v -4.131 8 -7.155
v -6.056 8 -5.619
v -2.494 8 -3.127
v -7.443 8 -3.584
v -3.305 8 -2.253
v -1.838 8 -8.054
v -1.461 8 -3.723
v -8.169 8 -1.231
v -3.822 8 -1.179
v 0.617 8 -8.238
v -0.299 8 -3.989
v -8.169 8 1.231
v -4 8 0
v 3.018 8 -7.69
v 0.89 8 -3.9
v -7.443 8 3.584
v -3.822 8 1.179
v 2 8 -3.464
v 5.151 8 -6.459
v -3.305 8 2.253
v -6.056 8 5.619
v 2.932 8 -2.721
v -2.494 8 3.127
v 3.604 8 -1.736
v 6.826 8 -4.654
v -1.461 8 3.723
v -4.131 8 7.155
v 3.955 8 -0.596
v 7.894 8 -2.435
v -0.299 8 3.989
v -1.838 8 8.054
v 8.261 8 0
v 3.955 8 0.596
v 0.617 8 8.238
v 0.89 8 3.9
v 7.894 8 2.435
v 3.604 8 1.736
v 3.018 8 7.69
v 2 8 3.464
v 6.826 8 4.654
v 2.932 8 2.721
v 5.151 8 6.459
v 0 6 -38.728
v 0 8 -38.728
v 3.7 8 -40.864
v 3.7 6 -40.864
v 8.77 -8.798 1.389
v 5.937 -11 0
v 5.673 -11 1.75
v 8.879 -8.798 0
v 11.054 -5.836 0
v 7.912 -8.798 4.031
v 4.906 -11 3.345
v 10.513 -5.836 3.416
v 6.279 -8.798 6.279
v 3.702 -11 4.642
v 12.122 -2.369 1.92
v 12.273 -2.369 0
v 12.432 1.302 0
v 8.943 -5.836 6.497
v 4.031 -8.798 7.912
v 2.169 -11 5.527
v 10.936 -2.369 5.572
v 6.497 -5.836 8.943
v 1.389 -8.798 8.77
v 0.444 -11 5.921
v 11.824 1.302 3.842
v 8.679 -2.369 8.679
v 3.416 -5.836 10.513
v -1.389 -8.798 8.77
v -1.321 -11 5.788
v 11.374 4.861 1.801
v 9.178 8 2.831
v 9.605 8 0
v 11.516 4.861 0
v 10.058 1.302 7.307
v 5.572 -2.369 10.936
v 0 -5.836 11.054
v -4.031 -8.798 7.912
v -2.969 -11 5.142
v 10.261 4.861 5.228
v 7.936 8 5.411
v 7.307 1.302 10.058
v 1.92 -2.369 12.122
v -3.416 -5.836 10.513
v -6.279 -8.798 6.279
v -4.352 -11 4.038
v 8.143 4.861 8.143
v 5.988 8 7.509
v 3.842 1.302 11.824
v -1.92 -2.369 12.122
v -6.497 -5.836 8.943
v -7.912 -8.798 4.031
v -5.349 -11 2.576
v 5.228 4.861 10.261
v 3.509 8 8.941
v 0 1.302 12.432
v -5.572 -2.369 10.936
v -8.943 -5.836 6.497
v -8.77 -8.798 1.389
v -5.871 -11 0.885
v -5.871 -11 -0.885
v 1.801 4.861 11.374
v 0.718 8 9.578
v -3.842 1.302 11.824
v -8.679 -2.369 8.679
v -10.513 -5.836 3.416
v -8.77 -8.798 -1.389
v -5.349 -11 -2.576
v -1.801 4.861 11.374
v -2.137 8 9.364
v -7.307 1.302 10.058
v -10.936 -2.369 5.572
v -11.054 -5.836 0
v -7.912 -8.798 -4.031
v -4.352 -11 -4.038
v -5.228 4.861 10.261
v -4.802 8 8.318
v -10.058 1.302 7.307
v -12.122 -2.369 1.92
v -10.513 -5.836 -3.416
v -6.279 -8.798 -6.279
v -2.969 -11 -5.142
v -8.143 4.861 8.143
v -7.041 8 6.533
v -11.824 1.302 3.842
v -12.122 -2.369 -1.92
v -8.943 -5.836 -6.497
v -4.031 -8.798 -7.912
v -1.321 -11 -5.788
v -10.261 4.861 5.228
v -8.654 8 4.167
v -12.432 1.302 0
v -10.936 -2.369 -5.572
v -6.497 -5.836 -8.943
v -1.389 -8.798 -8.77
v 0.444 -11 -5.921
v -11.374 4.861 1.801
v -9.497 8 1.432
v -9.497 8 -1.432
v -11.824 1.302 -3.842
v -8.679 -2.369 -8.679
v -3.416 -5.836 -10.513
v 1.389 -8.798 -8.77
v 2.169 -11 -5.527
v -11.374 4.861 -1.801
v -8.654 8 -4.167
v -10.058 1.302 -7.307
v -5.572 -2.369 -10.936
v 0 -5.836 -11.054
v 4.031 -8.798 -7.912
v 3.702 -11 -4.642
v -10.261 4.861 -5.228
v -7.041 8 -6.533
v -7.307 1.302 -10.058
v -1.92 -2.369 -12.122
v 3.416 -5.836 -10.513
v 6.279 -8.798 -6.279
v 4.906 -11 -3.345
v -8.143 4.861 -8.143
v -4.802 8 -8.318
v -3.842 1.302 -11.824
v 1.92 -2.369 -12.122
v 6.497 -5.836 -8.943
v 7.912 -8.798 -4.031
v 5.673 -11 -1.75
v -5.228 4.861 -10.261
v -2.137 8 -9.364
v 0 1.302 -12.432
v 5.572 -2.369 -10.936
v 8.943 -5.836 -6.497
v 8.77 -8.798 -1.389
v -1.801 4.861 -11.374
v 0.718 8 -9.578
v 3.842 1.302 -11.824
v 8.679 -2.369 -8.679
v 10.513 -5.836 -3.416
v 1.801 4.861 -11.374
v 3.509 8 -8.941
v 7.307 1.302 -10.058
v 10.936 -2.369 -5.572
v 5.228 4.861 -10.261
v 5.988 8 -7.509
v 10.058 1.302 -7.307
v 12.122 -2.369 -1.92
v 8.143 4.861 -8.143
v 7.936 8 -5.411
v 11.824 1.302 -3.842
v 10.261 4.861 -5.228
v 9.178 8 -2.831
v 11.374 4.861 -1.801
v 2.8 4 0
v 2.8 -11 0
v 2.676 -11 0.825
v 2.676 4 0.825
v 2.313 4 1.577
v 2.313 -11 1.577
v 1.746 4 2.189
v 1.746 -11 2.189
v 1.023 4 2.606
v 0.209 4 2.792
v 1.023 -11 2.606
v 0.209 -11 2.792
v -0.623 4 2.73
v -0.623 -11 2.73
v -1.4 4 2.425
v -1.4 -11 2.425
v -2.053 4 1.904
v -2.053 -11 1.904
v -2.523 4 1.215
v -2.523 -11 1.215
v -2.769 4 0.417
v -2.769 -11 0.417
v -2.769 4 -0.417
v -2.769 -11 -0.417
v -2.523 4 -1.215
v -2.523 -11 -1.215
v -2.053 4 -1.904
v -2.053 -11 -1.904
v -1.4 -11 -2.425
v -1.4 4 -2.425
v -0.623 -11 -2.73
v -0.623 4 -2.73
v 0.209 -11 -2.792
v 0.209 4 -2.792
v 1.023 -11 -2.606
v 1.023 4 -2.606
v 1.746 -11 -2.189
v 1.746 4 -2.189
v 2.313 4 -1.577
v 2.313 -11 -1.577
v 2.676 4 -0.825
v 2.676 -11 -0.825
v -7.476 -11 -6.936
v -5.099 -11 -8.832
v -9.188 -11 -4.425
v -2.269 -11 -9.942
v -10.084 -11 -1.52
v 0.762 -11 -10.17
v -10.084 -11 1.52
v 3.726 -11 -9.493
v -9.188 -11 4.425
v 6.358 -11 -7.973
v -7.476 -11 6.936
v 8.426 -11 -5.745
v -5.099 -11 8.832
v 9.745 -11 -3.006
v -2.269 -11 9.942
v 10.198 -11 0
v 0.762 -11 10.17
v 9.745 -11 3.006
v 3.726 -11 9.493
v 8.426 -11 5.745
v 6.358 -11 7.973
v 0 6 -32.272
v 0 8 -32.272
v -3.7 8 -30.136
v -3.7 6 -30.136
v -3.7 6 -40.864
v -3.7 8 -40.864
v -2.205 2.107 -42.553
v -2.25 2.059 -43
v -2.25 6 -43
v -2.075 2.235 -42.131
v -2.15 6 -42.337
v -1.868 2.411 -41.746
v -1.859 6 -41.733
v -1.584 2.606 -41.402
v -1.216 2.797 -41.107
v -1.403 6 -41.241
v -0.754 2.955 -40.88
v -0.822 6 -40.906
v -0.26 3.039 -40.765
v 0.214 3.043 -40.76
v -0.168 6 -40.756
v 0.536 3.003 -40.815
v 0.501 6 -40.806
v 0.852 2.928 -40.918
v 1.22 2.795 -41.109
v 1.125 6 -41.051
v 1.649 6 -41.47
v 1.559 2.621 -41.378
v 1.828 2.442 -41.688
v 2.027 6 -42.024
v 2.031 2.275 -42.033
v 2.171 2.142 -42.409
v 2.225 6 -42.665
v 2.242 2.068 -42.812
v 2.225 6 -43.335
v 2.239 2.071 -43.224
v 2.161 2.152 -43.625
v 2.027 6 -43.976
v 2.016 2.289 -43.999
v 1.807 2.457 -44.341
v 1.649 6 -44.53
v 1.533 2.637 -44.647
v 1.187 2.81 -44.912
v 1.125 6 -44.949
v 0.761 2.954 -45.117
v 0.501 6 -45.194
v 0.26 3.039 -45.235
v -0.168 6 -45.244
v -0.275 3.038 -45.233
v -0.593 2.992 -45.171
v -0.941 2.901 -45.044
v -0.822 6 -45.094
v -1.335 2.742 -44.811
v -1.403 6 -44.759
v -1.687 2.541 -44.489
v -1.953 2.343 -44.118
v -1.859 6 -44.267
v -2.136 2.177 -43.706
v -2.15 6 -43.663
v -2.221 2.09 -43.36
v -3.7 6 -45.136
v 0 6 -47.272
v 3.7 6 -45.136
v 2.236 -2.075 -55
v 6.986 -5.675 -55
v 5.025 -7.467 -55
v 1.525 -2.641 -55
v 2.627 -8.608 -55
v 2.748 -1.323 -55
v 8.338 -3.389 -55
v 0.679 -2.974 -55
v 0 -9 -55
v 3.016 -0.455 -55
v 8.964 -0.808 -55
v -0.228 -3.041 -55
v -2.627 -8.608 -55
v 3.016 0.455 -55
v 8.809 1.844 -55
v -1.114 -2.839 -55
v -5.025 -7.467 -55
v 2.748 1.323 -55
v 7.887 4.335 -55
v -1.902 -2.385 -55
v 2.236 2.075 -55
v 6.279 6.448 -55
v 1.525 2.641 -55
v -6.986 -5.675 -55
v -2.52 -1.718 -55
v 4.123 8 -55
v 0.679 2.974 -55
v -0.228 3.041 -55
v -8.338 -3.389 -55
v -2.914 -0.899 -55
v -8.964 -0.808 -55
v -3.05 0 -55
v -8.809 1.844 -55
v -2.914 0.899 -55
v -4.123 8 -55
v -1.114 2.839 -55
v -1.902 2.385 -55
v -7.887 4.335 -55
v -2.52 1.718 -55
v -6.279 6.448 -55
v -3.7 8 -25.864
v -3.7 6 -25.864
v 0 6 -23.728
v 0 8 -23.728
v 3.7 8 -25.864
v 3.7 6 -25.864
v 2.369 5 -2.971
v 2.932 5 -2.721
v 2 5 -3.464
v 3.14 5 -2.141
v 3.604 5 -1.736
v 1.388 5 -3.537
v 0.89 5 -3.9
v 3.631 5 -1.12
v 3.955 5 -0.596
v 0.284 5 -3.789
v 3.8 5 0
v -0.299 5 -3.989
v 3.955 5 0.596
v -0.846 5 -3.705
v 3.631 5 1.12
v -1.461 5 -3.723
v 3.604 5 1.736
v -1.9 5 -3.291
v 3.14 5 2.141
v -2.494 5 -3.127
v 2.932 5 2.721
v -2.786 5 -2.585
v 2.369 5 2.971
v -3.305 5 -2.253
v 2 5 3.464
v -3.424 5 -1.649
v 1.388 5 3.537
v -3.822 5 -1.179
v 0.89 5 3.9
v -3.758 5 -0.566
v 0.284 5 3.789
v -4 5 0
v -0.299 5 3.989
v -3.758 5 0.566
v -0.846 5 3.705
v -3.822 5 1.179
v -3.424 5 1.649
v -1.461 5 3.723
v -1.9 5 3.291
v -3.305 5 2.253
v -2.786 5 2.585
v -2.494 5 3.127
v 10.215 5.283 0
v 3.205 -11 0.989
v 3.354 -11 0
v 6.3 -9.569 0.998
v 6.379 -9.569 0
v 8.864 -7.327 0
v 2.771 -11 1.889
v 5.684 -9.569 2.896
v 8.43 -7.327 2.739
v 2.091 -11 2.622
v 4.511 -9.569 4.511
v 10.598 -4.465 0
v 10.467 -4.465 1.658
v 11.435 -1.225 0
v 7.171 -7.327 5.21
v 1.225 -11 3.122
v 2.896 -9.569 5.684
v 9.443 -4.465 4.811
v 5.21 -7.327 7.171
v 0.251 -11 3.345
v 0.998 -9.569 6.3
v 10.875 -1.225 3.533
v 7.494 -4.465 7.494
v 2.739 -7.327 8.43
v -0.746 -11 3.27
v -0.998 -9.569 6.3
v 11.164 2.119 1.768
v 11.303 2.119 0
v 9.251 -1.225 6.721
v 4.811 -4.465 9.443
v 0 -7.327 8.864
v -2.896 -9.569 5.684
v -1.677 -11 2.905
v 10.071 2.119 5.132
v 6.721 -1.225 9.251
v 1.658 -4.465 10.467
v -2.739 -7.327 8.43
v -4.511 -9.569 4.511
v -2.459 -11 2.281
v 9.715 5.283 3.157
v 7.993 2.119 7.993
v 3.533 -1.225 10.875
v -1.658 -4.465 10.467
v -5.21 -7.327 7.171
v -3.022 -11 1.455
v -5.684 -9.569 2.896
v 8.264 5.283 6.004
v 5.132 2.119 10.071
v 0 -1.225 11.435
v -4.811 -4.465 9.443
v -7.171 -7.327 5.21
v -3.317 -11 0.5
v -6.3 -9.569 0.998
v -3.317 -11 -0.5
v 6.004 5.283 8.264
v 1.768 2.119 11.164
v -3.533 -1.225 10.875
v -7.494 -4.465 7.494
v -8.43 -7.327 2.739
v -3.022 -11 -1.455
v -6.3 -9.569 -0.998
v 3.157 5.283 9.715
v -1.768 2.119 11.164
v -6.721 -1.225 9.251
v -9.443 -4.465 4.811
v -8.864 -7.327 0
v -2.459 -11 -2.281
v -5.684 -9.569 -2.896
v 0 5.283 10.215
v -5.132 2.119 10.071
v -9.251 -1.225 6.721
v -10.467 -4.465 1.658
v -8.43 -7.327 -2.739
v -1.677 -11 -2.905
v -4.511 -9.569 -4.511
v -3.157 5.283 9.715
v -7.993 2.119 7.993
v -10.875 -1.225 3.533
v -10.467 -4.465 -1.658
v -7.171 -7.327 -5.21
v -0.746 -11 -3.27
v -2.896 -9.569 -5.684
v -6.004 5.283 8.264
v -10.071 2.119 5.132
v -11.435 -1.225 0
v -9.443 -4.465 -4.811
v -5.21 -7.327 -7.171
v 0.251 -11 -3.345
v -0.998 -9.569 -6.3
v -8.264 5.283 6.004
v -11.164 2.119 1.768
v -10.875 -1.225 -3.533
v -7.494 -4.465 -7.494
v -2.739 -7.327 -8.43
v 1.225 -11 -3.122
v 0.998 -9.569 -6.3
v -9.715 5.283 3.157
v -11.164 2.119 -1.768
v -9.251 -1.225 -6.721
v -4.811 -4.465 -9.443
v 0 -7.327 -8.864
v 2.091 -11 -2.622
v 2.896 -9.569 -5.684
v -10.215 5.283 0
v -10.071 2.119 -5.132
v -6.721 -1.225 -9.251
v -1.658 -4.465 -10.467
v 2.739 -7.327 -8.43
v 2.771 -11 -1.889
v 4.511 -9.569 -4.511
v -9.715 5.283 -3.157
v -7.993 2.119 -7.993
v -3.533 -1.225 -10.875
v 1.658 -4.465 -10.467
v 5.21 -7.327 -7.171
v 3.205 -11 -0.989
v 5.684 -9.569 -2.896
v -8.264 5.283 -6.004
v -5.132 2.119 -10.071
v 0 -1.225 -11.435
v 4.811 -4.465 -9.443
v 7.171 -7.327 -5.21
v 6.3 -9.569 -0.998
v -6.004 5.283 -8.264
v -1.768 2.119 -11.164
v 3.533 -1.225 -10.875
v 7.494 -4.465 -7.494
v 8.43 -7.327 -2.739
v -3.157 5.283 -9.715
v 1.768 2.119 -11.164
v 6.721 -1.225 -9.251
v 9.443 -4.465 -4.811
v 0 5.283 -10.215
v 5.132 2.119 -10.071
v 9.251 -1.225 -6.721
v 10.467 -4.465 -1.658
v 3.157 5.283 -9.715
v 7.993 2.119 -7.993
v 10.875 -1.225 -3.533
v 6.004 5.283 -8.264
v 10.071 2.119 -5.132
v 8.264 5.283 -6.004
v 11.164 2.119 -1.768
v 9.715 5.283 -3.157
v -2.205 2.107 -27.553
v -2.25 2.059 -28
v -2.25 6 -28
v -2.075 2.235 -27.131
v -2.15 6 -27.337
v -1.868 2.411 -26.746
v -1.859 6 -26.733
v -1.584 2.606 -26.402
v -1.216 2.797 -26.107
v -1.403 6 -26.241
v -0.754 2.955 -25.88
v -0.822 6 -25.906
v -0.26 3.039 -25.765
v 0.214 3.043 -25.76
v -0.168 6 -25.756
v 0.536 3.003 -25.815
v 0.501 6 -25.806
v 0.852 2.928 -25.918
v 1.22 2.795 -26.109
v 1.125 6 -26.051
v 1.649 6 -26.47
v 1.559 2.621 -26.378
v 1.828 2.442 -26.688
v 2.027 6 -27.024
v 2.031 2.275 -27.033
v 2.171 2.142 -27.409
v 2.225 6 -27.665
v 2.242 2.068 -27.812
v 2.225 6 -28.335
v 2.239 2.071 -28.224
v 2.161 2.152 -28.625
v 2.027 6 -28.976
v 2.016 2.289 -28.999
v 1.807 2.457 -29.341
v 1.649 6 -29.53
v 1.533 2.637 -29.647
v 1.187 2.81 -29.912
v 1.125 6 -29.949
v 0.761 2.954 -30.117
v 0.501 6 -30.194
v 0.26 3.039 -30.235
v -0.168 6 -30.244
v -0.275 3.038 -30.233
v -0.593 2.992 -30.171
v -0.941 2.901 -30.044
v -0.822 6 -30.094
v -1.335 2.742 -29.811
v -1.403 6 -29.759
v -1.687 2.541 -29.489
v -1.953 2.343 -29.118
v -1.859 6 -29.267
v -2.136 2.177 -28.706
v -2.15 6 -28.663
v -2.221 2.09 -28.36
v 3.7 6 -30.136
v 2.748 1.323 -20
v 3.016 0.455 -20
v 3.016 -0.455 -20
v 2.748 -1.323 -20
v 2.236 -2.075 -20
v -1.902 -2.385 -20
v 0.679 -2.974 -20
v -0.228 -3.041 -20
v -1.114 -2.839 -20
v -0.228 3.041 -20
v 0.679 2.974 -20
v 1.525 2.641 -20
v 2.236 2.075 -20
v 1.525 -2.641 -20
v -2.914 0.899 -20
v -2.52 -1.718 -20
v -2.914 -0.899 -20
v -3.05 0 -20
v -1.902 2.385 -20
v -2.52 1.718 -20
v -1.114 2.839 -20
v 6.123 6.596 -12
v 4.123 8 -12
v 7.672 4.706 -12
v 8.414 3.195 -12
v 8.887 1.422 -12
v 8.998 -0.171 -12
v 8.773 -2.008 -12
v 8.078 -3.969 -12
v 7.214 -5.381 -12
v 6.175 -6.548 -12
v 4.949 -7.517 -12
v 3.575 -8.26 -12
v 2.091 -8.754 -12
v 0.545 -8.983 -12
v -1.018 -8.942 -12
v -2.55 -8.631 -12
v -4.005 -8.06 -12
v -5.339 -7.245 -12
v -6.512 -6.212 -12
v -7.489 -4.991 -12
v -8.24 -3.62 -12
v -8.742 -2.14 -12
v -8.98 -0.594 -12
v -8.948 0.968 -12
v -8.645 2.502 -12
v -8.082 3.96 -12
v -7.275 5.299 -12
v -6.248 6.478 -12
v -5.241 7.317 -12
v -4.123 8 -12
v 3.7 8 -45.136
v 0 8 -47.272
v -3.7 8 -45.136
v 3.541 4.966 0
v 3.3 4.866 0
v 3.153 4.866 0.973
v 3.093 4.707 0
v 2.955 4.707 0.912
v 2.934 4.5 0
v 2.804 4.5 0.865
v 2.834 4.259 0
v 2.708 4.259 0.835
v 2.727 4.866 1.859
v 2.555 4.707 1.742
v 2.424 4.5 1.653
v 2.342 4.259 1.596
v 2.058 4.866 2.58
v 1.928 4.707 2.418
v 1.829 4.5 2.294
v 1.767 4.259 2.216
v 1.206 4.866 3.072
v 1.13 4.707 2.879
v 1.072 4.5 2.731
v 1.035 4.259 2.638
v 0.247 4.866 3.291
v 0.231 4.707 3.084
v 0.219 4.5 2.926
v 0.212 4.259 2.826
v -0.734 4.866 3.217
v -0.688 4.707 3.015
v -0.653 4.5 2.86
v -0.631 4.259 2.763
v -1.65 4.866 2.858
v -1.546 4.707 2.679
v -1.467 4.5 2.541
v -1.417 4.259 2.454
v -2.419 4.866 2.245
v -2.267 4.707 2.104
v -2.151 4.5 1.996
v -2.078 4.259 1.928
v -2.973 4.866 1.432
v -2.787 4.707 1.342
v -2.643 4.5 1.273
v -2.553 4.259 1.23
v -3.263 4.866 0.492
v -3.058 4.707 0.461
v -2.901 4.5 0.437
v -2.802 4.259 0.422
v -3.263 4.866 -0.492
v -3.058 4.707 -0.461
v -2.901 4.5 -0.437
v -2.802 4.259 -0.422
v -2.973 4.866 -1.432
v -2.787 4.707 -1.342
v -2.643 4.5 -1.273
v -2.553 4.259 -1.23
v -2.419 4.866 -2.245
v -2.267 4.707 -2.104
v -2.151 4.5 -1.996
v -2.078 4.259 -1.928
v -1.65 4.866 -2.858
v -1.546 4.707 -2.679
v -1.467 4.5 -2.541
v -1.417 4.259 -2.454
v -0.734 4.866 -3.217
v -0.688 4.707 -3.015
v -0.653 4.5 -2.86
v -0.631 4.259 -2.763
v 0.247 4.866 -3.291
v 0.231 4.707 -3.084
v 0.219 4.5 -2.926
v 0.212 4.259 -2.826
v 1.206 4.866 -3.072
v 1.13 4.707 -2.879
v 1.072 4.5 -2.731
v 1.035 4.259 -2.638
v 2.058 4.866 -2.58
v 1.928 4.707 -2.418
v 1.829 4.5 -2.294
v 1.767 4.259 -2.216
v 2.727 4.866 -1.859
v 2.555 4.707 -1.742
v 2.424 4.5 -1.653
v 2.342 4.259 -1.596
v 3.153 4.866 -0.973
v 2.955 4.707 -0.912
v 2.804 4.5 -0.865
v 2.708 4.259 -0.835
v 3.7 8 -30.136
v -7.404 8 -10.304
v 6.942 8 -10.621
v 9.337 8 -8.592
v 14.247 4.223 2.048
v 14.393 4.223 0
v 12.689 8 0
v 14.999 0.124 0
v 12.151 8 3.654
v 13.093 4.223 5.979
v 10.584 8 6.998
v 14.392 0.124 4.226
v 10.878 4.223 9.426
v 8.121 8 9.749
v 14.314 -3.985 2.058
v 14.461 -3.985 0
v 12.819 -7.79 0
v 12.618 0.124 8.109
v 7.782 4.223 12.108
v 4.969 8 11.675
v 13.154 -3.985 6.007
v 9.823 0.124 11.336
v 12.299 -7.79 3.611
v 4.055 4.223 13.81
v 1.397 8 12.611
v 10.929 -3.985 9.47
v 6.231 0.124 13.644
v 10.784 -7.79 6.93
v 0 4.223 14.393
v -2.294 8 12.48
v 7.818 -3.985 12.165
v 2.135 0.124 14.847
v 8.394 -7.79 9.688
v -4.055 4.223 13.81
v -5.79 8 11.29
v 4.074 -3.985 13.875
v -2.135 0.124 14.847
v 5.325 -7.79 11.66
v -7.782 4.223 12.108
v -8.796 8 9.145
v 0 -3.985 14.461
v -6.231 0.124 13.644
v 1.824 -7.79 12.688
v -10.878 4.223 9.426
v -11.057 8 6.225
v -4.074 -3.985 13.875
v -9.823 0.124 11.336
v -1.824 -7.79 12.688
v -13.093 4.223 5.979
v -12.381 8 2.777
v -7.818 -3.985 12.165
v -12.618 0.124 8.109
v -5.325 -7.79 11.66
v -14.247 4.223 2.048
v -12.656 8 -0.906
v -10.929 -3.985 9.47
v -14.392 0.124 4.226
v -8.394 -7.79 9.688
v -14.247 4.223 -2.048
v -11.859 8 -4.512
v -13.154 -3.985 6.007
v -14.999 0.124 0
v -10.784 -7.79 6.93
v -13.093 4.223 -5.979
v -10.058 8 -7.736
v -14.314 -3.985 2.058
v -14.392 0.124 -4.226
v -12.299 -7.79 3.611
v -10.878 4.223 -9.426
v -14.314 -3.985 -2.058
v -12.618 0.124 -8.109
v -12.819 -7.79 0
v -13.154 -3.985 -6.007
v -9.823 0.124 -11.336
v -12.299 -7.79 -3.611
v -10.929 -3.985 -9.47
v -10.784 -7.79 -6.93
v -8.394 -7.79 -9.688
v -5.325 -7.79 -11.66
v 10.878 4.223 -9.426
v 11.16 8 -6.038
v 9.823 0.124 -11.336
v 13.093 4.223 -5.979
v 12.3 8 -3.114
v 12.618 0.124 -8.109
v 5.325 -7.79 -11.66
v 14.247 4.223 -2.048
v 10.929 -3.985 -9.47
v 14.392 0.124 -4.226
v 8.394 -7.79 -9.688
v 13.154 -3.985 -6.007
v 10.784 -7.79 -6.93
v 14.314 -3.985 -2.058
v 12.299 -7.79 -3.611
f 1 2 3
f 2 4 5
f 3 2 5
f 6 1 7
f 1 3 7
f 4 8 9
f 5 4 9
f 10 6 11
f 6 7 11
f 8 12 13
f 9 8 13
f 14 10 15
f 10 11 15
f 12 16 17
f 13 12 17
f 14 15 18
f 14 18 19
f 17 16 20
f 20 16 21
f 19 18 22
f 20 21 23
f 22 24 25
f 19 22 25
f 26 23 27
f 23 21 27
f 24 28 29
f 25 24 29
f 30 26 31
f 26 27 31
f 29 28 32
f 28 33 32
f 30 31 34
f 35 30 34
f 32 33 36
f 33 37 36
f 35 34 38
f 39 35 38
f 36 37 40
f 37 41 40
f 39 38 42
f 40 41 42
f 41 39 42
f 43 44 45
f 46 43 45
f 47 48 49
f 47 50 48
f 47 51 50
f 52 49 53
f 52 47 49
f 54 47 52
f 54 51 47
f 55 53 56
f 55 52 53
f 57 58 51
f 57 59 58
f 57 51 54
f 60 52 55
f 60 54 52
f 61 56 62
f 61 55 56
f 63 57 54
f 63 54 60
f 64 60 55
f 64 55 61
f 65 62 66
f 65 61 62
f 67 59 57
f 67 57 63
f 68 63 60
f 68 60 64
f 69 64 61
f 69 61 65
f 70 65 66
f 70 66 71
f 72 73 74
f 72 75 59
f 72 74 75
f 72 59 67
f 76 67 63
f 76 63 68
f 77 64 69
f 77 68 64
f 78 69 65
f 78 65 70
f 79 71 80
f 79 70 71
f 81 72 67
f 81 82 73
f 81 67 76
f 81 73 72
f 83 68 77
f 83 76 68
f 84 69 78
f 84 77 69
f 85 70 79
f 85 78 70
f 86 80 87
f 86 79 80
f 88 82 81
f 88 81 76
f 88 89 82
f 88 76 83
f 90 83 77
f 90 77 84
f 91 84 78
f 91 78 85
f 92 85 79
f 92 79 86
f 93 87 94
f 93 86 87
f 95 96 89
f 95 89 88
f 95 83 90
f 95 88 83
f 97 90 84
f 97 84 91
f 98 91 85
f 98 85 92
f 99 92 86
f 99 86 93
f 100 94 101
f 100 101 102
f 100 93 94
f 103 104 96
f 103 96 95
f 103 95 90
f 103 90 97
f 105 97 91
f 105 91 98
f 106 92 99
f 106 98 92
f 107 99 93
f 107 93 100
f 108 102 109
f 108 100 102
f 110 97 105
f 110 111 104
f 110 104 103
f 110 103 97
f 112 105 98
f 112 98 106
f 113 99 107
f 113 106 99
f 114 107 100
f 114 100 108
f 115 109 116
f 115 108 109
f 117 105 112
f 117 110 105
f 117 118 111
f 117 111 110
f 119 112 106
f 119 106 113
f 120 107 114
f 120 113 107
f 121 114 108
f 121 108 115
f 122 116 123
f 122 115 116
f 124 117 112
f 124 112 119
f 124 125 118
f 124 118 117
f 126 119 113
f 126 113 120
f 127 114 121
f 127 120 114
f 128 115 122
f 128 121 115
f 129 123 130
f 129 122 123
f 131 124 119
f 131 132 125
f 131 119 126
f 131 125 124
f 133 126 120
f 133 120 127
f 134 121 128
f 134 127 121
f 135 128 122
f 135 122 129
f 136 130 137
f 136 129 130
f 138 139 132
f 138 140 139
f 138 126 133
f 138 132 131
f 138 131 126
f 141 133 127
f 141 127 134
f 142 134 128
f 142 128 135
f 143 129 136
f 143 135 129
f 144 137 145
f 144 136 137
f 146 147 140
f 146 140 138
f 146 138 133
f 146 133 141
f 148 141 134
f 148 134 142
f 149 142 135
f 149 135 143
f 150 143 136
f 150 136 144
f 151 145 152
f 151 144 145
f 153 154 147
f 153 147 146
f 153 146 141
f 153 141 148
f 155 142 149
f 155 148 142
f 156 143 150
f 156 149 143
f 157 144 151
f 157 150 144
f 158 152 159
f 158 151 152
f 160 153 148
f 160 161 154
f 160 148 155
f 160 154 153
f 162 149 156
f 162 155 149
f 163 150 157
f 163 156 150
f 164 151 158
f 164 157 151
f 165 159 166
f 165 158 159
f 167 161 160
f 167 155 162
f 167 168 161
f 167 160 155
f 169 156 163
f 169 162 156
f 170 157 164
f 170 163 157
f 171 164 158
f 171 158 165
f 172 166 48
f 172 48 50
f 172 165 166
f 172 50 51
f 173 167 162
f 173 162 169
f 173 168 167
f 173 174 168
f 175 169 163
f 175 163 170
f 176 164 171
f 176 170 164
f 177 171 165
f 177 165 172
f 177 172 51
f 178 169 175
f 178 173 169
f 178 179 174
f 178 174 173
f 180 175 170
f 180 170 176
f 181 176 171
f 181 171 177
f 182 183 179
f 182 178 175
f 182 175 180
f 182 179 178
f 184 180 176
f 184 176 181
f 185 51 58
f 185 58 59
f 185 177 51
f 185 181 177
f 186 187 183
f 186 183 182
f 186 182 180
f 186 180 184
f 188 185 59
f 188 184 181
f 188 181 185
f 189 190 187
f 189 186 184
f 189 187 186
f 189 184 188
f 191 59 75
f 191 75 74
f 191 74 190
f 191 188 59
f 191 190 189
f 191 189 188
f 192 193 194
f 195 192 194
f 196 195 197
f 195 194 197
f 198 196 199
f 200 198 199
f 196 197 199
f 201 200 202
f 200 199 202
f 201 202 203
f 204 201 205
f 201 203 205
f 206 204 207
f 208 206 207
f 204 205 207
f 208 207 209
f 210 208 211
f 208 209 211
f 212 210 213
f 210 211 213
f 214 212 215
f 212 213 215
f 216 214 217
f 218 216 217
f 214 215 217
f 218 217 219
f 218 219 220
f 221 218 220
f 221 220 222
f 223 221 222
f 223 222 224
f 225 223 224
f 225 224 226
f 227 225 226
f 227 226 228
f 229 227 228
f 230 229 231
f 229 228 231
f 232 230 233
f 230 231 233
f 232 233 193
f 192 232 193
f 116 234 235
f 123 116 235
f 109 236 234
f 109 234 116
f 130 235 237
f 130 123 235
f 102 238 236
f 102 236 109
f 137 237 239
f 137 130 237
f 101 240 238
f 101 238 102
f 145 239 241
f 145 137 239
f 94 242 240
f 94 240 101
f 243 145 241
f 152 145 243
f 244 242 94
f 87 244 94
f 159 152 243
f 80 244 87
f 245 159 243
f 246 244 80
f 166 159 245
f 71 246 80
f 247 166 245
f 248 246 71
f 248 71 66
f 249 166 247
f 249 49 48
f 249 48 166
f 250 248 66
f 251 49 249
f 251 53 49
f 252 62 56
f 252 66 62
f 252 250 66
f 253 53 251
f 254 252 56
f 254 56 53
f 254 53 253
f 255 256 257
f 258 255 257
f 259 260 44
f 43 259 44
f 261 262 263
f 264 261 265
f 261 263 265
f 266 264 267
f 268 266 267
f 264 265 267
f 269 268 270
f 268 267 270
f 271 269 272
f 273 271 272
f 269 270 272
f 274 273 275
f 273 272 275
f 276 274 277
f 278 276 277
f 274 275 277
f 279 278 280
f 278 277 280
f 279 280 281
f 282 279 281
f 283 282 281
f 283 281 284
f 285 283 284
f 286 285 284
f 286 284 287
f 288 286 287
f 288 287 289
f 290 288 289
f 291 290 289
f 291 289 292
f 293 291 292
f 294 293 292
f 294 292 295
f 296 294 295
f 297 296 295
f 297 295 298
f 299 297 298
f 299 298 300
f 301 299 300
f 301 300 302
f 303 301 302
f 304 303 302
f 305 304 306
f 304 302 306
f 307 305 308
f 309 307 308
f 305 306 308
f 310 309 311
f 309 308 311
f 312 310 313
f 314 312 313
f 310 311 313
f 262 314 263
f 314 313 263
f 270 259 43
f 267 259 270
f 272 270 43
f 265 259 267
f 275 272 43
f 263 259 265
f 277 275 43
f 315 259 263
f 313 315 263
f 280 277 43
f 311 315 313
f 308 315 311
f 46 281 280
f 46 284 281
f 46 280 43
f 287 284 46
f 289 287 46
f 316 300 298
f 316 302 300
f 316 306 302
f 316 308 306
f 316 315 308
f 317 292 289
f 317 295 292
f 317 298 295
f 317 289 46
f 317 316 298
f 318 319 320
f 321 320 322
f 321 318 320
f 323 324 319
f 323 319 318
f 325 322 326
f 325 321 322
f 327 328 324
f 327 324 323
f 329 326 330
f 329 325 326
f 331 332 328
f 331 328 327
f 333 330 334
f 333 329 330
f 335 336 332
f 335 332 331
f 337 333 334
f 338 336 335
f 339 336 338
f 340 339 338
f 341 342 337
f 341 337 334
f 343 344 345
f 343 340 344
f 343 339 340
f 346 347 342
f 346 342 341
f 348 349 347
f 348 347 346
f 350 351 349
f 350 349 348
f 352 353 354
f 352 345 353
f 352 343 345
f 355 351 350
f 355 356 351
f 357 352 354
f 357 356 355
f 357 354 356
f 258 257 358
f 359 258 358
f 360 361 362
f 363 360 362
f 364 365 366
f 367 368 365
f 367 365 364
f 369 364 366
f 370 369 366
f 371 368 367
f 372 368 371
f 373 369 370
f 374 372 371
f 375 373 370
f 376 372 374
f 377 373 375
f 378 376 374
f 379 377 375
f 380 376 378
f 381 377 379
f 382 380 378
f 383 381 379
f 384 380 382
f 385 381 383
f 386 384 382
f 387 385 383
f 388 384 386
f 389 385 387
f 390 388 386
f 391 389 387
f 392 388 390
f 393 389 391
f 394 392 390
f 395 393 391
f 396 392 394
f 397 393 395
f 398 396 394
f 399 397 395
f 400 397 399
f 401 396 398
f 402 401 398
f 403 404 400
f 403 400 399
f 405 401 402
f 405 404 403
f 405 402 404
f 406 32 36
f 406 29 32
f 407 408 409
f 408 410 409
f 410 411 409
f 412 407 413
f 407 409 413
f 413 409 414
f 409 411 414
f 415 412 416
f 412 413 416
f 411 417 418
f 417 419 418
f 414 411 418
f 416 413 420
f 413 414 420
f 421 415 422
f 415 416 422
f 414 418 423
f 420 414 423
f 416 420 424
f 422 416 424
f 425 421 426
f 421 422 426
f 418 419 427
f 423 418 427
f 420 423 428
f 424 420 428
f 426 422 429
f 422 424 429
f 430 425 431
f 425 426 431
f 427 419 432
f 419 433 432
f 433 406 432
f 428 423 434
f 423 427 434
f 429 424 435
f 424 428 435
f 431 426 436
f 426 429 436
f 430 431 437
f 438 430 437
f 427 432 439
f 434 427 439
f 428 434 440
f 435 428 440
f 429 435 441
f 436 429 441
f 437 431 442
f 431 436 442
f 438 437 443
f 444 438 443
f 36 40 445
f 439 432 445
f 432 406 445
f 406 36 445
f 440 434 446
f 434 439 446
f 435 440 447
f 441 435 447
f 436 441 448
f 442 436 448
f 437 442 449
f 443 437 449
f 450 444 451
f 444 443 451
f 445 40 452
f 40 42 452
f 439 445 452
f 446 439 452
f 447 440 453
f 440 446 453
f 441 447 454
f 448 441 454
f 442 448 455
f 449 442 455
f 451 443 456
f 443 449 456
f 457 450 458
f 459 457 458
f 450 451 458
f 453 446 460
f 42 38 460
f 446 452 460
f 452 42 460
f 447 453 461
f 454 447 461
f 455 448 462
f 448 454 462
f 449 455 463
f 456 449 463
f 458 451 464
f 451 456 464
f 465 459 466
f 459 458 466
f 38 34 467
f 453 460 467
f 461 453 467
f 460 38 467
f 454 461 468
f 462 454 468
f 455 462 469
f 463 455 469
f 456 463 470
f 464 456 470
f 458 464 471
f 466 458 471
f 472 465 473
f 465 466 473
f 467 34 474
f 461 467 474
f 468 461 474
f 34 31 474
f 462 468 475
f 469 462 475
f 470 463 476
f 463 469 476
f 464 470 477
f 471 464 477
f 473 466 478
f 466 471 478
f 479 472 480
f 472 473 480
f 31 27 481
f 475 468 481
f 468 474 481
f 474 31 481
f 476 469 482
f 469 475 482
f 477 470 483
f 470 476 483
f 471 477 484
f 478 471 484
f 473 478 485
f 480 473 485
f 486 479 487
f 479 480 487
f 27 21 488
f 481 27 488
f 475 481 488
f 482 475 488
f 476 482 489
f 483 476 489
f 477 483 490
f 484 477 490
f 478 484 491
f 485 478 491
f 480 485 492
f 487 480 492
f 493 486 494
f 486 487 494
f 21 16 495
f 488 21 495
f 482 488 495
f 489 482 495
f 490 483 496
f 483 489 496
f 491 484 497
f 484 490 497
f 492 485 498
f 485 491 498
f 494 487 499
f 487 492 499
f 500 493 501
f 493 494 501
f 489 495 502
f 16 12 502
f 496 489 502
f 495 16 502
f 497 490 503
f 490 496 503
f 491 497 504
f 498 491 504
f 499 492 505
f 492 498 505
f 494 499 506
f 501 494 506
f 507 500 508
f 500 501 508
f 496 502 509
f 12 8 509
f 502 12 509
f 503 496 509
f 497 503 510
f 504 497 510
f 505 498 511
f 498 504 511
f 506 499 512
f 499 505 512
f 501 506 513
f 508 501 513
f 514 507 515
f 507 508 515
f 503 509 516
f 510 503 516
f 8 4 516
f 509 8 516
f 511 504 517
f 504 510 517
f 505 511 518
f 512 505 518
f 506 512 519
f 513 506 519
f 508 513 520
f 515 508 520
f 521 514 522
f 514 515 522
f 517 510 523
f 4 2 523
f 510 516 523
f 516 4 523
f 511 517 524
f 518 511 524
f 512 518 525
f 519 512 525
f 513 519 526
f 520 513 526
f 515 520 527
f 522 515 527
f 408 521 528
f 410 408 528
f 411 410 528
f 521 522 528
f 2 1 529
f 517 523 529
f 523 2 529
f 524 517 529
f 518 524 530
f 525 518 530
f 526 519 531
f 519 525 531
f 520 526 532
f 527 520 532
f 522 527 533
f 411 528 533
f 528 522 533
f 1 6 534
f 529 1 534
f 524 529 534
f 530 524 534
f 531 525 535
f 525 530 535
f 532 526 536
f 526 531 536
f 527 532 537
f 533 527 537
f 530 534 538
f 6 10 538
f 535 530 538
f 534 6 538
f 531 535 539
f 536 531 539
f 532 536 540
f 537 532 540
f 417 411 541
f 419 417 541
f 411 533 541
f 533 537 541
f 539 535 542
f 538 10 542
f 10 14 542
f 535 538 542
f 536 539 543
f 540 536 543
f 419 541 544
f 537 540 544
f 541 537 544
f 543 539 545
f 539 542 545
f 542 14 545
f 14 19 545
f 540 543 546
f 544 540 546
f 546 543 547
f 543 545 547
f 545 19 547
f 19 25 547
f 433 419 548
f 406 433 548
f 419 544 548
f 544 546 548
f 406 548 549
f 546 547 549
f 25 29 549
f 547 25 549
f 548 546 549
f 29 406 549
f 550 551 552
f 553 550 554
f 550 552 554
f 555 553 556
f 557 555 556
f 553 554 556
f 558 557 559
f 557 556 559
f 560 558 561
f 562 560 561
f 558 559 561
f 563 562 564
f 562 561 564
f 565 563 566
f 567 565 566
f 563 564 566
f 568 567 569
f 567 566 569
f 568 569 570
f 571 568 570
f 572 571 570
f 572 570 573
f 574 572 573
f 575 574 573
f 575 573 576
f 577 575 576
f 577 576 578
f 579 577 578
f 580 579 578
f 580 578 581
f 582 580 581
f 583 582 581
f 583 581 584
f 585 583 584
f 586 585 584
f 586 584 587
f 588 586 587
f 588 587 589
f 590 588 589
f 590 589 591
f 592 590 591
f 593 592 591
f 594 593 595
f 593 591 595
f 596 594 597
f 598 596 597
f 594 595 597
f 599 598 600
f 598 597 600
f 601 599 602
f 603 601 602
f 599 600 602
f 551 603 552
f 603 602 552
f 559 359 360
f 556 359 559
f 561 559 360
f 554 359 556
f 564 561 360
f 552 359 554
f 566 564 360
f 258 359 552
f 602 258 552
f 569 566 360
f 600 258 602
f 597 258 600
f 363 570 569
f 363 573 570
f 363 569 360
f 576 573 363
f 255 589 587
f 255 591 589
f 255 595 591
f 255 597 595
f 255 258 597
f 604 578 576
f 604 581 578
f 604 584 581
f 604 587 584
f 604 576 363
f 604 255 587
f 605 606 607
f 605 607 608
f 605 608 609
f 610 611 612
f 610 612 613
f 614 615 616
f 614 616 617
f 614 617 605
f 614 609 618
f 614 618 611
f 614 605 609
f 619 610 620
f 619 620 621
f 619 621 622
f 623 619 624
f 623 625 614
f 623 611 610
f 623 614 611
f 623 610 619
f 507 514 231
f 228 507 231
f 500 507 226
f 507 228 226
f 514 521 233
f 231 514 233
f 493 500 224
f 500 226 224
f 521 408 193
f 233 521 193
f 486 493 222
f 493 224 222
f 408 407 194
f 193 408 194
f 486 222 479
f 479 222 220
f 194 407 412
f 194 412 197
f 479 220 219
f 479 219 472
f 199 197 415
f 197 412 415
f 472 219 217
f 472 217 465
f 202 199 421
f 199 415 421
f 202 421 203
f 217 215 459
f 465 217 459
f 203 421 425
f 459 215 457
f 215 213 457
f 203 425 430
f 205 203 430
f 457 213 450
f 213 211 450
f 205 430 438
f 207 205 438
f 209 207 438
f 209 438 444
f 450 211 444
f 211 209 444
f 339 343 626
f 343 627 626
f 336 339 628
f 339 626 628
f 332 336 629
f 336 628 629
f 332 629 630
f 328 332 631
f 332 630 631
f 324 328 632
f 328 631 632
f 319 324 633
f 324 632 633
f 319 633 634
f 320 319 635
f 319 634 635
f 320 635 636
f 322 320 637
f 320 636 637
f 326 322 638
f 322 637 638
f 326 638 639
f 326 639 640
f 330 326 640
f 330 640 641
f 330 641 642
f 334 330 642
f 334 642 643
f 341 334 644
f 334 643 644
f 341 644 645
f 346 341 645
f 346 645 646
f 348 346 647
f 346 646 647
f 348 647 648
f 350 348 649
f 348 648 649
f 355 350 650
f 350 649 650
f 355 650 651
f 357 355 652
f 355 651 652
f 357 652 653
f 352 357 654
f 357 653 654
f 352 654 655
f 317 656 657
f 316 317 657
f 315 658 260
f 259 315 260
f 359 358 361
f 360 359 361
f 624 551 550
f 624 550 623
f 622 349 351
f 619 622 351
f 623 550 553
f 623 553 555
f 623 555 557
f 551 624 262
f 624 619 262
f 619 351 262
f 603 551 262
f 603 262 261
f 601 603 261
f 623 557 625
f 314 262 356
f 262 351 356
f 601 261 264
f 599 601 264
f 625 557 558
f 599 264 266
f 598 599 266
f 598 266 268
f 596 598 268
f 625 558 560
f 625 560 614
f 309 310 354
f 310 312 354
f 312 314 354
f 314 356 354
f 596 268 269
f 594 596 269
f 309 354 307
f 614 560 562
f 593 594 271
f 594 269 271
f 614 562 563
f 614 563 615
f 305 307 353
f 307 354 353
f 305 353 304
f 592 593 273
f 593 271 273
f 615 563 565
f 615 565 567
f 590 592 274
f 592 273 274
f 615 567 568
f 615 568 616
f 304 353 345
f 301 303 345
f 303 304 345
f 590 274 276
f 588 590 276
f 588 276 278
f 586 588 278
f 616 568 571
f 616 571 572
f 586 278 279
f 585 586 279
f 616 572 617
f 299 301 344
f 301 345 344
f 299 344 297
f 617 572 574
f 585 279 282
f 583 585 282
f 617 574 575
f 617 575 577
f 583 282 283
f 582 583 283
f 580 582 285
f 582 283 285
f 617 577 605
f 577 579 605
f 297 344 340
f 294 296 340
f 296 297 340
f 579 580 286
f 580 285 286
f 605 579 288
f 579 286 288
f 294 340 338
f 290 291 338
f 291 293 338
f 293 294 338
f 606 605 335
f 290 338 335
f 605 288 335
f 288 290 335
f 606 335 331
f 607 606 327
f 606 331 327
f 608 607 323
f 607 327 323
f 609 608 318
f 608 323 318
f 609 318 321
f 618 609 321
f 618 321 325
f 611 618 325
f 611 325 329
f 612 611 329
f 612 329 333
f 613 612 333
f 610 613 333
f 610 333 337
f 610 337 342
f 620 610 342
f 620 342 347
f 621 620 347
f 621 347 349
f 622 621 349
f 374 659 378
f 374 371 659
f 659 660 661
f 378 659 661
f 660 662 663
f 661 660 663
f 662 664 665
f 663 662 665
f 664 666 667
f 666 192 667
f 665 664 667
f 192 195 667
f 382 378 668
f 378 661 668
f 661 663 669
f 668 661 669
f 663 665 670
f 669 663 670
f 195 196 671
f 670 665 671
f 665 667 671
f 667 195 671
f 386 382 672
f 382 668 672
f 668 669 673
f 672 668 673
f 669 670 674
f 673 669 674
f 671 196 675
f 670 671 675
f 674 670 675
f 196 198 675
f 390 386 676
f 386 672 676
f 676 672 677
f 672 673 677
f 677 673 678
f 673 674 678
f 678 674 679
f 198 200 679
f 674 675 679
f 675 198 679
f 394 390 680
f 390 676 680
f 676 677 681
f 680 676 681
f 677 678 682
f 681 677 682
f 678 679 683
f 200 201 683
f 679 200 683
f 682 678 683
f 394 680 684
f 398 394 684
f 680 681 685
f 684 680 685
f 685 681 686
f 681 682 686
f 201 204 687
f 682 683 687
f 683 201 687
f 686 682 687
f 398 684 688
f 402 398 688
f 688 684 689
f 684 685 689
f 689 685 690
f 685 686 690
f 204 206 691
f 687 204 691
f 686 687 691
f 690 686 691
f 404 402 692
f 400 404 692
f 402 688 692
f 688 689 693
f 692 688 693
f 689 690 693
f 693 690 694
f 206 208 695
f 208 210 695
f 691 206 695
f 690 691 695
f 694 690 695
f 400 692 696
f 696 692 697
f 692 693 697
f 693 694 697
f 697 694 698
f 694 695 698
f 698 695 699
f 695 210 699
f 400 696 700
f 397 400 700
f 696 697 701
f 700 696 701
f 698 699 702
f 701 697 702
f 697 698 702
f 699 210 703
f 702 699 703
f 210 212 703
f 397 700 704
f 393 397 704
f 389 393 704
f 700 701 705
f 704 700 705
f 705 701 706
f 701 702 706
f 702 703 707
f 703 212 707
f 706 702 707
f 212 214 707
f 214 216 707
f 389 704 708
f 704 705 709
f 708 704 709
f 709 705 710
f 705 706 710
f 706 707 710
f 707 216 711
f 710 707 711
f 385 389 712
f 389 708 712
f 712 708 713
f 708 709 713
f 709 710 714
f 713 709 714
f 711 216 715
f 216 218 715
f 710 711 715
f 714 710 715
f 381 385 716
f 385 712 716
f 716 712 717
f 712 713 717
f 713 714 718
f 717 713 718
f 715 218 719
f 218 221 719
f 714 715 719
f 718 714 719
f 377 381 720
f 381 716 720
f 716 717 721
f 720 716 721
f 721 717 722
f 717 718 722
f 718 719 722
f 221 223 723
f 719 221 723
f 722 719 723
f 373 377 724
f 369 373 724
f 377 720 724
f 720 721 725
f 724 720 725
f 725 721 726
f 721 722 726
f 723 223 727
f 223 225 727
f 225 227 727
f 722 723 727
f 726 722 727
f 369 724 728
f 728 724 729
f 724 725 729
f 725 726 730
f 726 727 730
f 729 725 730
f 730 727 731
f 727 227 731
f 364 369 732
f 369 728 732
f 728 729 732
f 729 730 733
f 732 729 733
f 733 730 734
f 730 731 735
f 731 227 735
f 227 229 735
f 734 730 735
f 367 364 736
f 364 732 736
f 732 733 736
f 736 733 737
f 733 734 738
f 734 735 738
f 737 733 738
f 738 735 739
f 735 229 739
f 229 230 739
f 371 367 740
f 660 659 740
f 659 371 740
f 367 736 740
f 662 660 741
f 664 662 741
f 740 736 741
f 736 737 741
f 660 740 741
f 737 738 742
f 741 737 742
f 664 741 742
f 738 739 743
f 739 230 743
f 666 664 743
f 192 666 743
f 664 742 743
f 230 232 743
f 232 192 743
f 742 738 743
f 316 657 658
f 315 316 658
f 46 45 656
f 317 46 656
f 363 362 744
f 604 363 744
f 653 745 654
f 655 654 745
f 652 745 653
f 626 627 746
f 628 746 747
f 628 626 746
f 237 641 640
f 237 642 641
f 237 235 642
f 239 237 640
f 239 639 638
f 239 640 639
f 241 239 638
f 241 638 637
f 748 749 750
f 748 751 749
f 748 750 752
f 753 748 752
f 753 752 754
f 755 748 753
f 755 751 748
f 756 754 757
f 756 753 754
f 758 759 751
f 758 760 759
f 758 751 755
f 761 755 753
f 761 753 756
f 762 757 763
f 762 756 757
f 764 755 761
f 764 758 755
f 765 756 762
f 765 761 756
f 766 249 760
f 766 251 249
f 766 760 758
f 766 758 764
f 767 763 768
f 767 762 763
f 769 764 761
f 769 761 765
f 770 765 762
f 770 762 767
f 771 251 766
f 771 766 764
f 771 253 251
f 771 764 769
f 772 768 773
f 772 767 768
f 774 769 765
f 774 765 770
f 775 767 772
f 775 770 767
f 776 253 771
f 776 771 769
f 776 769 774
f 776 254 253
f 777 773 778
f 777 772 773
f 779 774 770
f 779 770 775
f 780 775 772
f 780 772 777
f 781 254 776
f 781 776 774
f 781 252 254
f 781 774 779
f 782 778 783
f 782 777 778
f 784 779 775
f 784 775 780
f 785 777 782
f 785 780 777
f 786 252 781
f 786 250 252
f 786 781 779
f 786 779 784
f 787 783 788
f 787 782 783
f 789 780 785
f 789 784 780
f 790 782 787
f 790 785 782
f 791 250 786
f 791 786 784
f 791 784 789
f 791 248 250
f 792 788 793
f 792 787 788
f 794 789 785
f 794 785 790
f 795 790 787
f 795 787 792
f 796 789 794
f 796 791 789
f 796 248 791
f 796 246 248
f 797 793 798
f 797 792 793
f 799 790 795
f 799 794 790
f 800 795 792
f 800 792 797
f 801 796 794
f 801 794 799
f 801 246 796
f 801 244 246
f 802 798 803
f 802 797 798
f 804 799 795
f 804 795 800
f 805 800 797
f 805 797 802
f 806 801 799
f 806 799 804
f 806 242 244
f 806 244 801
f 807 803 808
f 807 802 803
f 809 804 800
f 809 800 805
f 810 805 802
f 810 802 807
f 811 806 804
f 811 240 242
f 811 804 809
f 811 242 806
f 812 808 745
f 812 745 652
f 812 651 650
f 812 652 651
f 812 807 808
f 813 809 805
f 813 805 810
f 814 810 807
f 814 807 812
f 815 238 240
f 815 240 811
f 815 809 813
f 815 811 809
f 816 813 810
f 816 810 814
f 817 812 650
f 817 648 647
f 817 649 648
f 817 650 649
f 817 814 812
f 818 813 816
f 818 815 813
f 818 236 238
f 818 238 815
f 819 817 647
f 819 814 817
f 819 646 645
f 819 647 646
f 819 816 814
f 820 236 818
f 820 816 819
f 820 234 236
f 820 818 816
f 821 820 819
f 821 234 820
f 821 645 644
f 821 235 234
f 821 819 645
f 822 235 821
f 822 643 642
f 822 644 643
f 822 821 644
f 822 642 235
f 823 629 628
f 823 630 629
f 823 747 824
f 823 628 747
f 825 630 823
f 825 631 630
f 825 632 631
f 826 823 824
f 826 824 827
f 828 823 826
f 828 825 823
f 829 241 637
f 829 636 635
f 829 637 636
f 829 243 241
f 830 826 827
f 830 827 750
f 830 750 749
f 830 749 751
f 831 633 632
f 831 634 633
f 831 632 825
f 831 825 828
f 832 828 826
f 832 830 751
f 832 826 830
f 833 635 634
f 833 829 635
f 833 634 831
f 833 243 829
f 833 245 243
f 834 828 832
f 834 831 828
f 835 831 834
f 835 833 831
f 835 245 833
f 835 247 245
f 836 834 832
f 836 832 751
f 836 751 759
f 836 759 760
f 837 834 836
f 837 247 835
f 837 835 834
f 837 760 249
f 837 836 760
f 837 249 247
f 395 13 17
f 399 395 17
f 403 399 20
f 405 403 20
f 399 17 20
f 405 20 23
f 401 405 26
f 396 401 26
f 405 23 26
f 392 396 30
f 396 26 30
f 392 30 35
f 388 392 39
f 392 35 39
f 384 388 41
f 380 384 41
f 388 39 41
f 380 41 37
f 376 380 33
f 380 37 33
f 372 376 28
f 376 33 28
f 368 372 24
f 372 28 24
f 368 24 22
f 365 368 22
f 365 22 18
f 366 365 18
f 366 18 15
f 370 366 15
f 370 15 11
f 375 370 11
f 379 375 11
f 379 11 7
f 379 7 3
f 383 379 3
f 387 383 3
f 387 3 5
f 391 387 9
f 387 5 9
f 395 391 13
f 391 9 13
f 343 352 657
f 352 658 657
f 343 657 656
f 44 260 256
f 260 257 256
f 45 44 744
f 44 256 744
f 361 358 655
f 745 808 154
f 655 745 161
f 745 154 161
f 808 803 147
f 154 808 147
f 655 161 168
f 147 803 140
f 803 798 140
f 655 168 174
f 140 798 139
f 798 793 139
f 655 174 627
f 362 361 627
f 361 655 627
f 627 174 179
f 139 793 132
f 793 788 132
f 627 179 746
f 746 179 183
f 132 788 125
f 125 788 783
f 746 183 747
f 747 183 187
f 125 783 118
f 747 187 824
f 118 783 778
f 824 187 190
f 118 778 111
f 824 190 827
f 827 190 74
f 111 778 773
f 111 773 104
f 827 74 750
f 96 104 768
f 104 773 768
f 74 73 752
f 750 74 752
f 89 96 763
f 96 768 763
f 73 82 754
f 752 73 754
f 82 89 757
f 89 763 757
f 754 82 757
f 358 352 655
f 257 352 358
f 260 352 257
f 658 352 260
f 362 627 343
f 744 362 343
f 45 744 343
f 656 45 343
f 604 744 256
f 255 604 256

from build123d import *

# Parameters (mm, degrees)
BOSS_EXTRUDE2_REACH             = 37.299
BOSS_EXTRUDE2_END_RADIUS        = 15
BOSS_EXTRUDE2_DIRECTION_2_DEPTH = 40
SKETCH3_R                       = 3.05
CUT_EXTRUDE1_DEPTH              = 35
SKETCH4_R                       = 2.25
CUT_EXTRUDE3_DEPTH              = 2
CUT_EXTRUDE4_REACH              = 62.092
CUT_EXTRUDE4_END_RADIUS         = 3.05
SKETCH4_3_R                     = 2.25
SKETCH5_R                       = 4
CUT_EXTRUDE5_DEPTH              = 3
FILLET1_R                       = 1


with BuildPart() as part:
    # Sketch1 → Revolve1 (revolve)
    with BuildSketch(Plane.XY):
        with BuildLine():
            Line((8.261355821, 8), (2.8, 8))
            Line((2.8, 8), (2.8, -5.86600375))
            Line((2.8, -5.86600375), (2.8, -11))
            Line((2.8, -11), (3.354101966, -11))
            ThreePointArc((3.354101966, -11), (11.134617861, -2.875810338), (8.261355821, 8))
        make_face()
        with BuildLine():
            ThreePointArc((5.937171044, -11), (12.27344014, -2.369106824), (9.604686356, 8))
            Line((9.604686356, 8), (12.68857754, 8))
            ThreePointArc((12.68857754, 8), (14.872770572, -1.949537258), (10.198039027, -11))
            Line((10.198039027, -11), (5.937171044, -11))
        make_face()
    revolve(axis=Axis((0, 10, 0), (0, -1, 0)))

    # Boss-Extrude2: up to this sphere (the profile starts outside it)
    boss_extrude2_end = Location((0, 0, 0)) * Sphere(BOSS_EXTRUDE2_END_RADIUS, mode=Mode.PRIVATE)
    # Sketch2 → Boss-Extrude2 (add, up to the surface)
    with BuildSketch(Plane(origin=(0, 0, -15), x_dir=(-1, 0, 0), z_dir=(0, 0, -1)), mode=Mode.PRIVATE) as boss_extrude2_sk1:
        with BuildLine():
            Line((4.123105626, 8), (-4.123105626, 8))
            ThreePointArc((-4.123105626, 8), (0, -9), (4.123105626, 8))
        make_face()
    boss_extrude2_tool1 = extrude(boss_extrude2_sk1.sketch, amount=-BOSS_EXTRUDE2_REACH, mode=Mode.PRIVATE) - boss_extrude2_end
    add(boss_extrude2_tool1.solids().sort_by_distance((0, -0.187735, -15))[0])

    # Sketch2 → Boss-Extrude2 direction 2 (add)
    with BuildSketch(Plane(origin=(0, 0, -15), x_dir=(-1, 0, 0), z_dir=(0, 0, -1))):
        with BuildLine():
            Line((4.123105626, 8), (-4.123105626, 8))
            ThreePointArc((-4.123105626, 8), (0, -9), (4.123105626, 8))
        make_face()
    extrude(amount=BOSS_EXTRUDE2_DIRECTION_2_DEPTH)

    # Sketch3 → Cut-Extrude1 (cut)
    with BuildSketch(Plane(origin=(0, 0, -55), x_dir=(-1, 0, 0), z_dir=(0, 0, -1))):
        Circle(SKETCH3_R)
    extrude(amount=-CUT_EXTRUDE1_DEPTH, mode=Mode.SUBTRACT)

    # Sketch4 → Cut-Extrude3 (cut)
    # profile 1 of 2: a face of its own
    with BuildSketch(Plane(origin=(0, 8, 0), x_dir=(1, 0, 0), z_dir=(0, 1, 0))):
        Polygon((-3.7, 25.863804004), (0, 23.727608008), (3.7, 25.863804004), (3.7, 30.136195996), (0, 32.272391992), (-3.7, 30.136195996), align=None)
        with Locations(Location((0, 28, 0), (0, 0, 180))):
            Circle(SKETCH4_R, mode=Mode.SUBTRACT)
    # profile 2 of 2: a face of its own
    with BuildSketch(Plane(origin=(0, 8, 0), x_dir=(1, 0, 0), z_dir=(0, 1, 0))):
        Polygon((-3.7, 40.863804004), (0, 38.727608008), (3.7, 40.863804004), (3.7, 45.136195996), (0, 47.272391992), (-3.7, 45.136195996), align=None)
        with Locations(Location((0, 43, 0), (0, 0, 180))):
            Circle(SKETCH4_R, mode=Mode.SUBTRACT)
    extrude(amount=-CUT_EXTRUDE3_DEPTH, mode=Mode.SUBTRACT)

    # Cut-Extrude4: up to this cylinder (the profile starts outside it)
    cut_extrude4_end = Plane(origin=(0, 0, -35.5), z_dir=(0, 0, -1)) * Cylinder(CUT_EXTRUDE4_END_RADIUS, 146.284, mode=Mode.PRIVATE)
    # Sketch4<3> → Cut-Extrude4 (cut, up to the surface)
    with BuildSketch(Plane(origin=(0, 8, 0), x_dir=(1, 0, 0), z_dir=(0, 1, 0)), mode=Mode.PRIVATE) as cut_extrude4_sk1:
        with Locations(Location((0, 28, 0), (0, 0, 180))):
            Circle(SKETCH4_3_R)
    cut_extrude4_tool1 = extrude(cut_extrude4_sk1.sketch, amount=-CUT_EXTRUDE4_REACH, mode=Mode.PRIVATE) - cut_extrude4_end
    add(cut_extrude4_tool1.solids().sort_by_distance((0, 8, -28))[0], mode=Mode.SUBTRACT)
    # Sketch4<3> → Cut-Extrude4 (cut, up to the surface)
    with BuildSketch(Plane(origin=(0, 8, 0), x_dir=(1, 0, 0), z_dir=(0, 1, 0)), mode=Mode.PRIVATE) as cut_extrude4_sk2:
        with Locations(Location((0, 43, 0), (0, 0, 180))):
            Circle(SKETCH4_3_R)
    cut_extrude4_tool2 = extrude(cut_extrude4_sk2.sketch, amount=-CUT_EXTRUDE4_REACH, mode=Mode.PRIVATE) - cut_extrude4_end
    add(cut_extrude4_tool2.solids().sort_by_distance((0, 8, -43))[0], mode=Mode.SUBTRACT)

    # Sketch5 → Cut-Extrude5 (cut)
    with BuildSketch(Plane(origin=(0, 8, 0), x_dir=(1, 0, 0), z_dir=(0, 1, 0))):
        with Locations(Location((0, 0, 0), (0, 0, 180))):
            Circle(SKETCH5_R)
    extrude(amount=-CUT_EXTRUDE5_DEPTH, mode=Mode.SUBTRACT)

    # Fillet1
    fillet1_edges = [part.edges().sort_by_distance(p)[0] for p in [
        (-2.8, 5, 0),
    ]]
    fillet(fillet1_edges, radius=FILLET1_R)


solid = part.part
